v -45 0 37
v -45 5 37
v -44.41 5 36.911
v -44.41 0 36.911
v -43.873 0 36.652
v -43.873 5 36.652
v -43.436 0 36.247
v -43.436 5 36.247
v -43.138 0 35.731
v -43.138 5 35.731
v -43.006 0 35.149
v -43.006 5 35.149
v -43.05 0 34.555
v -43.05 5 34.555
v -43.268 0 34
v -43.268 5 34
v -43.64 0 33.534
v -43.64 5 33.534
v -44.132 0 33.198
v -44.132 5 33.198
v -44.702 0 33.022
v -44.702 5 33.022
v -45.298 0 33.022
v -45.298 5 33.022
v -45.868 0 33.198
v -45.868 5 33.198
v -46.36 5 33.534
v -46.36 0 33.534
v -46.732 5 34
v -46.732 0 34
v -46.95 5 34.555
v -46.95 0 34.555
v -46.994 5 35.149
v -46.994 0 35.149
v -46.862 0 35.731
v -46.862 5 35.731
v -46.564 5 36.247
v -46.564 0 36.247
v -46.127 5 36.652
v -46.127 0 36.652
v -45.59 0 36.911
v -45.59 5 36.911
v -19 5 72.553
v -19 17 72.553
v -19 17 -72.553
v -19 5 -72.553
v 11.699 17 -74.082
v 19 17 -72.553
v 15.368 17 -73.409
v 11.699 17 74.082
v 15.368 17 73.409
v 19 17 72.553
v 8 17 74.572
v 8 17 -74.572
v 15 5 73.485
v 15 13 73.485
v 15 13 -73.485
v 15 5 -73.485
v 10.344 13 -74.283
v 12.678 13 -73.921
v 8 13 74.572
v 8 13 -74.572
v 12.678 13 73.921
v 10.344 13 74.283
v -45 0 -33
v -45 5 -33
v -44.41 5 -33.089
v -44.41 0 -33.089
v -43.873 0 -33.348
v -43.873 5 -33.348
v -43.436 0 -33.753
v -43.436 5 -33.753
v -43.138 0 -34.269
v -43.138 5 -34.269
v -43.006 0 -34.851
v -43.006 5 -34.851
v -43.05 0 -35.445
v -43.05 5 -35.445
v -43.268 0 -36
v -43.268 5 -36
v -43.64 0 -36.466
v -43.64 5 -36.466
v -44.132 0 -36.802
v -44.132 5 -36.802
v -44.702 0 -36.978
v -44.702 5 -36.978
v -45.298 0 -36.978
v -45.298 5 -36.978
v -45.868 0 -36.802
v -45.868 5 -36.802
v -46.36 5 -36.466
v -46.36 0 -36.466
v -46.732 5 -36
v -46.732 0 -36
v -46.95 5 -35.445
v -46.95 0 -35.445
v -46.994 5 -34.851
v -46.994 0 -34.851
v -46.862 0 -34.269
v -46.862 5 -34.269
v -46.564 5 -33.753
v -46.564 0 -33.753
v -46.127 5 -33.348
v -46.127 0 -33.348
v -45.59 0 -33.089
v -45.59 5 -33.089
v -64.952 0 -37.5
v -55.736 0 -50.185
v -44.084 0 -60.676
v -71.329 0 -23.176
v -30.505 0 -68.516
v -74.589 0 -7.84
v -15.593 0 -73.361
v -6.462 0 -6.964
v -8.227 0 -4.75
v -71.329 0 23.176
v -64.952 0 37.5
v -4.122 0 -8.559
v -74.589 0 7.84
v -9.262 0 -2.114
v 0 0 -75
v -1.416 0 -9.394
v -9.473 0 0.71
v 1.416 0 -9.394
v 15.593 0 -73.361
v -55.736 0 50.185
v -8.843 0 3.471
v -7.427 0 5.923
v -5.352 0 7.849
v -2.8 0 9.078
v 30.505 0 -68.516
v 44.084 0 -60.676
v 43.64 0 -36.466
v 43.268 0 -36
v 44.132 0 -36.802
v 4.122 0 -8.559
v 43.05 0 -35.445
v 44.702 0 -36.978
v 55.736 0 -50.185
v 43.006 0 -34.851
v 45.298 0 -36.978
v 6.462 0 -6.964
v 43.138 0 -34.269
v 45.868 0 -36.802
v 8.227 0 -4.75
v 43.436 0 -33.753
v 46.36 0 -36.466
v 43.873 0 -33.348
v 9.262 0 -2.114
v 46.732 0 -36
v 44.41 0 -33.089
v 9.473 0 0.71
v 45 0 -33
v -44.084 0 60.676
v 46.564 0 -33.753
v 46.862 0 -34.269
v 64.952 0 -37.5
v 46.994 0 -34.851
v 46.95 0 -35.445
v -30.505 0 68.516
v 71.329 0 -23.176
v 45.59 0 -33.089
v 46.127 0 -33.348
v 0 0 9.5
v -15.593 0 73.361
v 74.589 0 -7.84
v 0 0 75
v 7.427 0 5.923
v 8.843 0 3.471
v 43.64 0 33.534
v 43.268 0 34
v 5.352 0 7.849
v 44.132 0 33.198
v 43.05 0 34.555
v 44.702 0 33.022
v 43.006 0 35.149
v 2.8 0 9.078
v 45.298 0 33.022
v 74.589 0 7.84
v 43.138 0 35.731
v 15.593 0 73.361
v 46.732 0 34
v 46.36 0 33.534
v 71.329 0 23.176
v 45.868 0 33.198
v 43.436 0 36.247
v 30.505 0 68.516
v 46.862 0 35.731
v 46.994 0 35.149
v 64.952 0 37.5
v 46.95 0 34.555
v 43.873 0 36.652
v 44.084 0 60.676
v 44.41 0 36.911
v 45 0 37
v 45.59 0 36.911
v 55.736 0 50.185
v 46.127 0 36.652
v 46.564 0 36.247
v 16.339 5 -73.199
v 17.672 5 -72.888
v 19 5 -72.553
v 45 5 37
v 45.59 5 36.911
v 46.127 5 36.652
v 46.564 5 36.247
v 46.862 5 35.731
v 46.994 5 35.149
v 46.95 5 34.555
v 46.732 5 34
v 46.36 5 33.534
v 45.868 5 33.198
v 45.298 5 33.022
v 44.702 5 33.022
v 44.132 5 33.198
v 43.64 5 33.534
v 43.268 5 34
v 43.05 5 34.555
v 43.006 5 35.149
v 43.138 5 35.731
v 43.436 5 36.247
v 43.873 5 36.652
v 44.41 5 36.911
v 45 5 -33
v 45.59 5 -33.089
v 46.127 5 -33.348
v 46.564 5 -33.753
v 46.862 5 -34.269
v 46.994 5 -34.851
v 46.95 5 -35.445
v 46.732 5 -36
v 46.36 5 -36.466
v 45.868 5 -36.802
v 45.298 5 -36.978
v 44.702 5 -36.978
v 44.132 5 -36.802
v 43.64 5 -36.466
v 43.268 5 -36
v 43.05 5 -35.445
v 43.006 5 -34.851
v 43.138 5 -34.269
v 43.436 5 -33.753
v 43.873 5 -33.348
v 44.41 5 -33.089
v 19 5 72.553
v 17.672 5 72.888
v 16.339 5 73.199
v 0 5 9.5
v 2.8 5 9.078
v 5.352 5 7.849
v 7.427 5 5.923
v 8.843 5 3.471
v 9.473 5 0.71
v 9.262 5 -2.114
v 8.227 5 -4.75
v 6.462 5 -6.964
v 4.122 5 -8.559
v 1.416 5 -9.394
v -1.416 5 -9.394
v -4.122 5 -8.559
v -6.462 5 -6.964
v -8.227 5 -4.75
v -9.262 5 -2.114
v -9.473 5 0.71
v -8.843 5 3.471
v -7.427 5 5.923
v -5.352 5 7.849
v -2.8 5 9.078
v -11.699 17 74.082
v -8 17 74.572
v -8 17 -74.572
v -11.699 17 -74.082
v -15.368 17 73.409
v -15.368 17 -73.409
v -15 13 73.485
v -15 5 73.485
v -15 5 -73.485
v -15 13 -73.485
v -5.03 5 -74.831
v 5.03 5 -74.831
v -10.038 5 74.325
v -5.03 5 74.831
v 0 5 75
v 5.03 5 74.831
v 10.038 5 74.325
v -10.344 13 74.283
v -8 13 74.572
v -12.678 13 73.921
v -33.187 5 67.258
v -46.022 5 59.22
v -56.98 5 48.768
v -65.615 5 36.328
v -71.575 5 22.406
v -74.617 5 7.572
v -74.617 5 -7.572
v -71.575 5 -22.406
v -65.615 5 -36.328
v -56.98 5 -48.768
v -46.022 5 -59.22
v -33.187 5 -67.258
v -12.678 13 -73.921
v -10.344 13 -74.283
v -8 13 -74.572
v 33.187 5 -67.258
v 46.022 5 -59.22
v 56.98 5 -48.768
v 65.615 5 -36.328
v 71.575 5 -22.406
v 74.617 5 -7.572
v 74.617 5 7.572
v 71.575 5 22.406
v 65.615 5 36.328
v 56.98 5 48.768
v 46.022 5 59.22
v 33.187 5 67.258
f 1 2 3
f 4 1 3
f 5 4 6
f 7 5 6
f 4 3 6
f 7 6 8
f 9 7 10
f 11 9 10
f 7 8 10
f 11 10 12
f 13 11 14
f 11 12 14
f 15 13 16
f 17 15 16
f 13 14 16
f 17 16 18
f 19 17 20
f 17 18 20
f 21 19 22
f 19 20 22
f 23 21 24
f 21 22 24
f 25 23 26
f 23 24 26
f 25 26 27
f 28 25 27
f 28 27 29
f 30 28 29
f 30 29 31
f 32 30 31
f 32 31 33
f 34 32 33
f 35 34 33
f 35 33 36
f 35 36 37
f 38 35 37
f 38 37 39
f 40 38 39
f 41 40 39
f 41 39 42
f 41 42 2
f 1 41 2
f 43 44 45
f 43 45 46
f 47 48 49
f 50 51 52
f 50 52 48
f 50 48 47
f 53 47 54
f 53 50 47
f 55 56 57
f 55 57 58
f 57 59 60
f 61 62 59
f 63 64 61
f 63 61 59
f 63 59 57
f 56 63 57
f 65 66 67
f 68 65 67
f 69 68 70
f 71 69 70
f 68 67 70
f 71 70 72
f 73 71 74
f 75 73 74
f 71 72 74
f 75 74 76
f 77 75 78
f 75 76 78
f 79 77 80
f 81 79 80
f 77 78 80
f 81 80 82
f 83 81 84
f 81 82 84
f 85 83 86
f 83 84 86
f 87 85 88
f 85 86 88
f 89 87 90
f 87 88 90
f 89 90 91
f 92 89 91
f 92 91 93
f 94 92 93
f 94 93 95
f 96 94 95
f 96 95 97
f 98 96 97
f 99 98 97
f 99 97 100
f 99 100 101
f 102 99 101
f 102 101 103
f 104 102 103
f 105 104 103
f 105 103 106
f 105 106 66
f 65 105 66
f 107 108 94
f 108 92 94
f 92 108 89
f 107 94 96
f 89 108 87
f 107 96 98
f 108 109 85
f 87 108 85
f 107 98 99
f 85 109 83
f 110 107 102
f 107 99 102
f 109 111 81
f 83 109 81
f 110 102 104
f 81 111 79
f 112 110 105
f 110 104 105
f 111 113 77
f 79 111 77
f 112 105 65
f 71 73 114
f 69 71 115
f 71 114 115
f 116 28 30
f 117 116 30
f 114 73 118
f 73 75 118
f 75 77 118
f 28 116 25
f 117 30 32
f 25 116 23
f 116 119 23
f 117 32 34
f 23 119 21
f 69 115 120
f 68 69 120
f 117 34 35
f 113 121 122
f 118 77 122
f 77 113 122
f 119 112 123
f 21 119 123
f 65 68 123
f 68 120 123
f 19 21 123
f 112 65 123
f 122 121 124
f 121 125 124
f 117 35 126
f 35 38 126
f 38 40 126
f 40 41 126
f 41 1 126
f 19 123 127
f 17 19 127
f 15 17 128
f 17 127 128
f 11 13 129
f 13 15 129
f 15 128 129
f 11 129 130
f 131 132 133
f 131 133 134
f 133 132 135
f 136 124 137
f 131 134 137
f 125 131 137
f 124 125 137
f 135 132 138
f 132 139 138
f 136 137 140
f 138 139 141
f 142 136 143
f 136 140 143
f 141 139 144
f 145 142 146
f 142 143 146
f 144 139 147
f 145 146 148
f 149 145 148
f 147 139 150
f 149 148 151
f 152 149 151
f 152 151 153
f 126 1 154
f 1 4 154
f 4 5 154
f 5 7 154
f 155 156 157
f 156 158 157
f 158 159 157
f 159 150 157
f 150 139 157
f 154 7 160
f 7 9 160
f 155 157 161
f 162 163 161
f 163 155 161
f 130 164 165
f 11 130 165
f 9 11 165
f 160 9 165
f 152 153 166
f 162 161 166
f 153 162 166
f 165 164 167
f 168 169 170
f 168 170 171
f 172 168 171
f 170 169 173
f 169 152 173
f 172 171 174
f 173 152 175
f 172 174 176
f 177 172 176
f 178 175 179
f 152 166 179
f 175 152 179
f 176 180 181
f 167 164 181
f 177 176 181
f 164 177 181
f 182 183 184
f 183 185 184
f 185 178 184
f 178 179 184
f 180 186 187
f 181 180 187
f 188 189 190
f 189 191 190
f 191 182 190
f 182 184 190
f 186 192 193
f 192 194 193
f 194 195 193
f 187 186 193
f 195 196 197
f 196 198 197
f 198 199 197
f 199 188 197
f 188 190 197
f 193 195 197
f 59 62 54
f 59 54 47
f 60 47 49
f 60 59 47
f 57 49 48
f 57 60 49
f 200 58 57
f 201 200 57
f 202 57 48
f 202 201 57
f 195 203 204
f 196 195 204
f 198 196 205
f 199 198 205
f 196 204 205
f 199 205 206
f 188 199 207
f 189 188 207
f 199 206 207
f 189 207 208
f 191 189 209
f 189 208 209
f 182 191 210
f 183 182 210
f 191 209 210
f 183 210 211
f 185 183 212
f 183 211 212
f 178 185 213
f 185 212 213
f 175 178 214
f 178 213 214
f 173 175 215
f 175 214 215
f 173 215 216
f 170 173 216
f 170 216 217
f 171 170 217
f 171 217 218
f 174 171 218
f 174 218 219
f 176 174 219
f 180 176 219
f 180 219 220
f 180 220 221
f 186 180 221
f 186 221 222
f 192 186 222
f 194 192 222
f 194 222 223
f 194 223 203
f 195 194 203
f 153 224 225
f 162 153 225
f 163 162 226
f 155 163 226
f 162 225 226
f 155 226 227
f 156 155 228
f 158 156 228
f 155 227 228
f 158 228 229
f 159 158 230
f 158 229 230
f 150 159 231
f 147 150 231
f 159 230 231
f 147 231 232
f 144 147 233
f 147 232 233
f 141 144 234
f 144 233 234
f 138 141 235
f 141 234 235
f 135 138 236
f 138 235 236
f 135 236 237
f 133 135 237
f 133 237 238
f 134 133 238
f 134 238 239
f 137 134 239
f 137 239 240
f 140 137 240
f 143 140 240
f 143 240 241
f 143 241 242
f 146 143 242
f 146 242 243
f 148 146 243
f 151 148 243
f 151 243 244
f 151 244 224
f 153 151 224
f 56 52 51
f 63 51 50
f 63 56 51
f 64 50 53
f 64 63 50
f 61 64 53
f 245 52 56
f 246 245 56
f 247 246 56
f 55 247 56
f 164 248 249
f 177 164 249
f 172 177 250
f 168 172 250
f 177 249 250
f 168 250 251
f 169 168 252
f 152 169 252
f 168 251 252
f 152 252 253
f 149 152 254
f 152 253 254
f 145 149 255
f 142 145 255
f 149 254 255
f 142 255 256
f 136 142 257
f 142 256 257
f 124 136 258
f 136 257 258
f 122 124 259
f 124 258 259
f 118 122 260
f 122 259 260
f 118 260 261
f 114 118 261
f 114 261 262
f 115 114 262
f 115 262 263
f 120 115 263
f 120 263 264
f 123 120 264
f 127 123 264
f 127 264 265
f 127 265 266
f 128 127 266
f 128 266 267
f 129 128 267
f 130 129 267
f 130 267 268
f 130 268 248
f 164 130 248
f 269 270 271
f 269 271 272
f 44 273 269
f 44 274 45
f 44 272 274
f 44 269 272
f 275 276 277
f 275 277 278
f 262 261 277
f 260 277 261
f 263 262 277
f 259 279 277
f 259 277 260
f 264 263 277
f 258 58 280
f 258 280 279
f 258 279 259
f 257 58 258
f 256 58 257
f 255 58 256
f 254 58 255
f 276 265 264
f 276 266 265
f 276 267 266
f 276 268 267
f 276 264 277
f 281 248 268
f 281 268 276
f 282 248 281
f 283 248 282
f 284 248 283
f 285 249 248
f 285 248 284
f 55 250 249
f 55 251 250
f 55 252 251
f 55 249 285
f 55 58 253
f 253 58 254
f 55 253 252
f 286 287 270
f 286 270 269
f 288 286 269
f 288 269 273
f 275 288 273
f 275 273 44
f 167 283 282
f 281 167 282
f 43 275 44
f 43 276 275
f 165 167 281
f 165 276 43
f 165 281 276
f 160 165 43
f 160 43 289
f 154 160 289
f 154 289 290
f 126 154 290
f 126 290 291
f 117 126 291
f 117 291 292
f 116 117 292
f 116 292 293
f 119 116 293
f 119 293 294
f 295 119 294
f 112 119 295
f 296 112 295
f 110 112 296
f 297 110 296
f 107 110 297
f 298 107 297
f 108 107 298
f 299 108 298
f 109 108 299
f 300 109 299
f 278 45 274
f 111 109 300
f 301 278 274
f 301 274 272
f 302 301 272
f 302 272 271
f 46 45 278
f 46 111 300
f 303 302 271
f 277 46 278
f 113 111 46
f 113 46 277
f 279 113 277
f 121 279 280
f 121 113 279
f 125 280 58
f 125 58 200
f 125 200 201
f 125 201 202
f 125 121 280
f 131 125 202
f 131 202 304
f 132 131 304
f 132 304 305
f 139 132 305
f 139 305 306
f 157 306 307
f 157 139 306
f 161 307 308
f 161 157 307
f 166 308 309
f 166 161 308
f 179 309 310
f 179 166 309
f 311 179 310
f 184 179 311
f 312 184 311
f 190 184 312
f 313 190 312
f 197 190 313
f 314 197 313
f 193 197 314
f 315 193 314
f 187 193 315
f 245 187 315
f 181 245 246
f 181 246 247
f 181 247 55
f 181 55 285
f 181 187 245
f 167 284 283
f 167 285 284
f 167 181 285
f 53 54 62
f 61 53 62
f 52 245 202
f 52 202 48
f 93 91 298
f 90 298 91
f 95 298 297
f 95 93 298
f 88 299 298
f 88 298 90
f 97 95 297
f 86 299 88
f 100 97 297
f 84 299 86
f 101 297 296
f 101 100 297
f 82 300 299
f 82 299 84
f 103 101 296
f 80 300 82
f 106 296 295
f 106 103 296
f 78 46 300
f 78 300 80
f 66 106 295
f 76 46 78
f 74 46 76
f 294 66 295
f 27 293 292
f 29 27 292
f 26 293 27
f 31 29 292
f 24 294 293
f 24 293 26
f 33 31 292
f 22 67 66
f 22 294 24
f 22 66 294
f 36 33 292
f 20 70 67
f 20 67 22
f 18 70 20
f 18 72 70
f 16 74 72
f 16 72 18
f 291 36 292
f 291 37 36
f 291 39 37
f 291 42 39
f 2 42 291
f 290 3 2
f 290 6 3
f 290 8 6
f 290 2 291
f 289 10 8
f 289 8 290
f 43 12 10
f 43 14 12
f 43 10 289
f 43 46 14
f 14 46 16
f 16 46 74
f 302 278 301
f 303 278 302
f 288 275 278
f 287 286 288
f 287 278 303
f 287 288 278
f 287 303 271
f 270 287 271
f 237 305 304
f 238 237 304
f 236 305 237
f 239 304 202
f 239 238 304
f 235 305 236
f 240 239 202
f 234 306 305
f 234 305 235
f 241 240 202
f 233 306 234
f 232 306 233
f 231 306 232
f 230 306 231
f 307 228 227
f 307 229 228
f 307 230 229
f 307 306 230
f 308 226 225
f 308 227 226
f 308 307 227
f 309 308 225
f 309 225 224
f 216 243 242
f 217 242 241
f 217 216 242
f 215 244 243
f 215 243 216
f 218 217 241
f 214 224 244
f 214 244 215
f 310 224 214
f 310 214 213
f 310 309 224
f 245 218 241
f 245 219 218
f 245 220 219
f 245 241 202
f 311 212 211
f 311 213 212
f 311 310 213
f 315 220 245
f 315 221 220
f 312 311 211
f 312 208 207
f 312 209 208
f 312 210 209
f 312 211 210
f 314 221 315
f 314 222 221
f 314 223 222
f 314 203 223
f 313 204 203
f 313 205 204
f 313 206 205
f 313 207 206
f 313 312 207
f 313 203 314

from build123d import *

# Parameters (mm, degrees)
SKETCH1_R                            = 75
BOSS_EXTRUDE1_DEPTH                  = 5
BOSS_EXTRUDE2_REACH                  = 108.184
BOSS_EXTRUDE2_END_RADIUS             = 75
BOSS_EXTRUDE2_DIRECTION_2_REACH      = 108.184
BOSS_EXTRUDE2_DIRECTION_2_END_RADIUS = 75
SKETCH3_R                            = 9.5
CUT_EXTRUDE1_DEPTH                   = 107.742681248
SKETCH4_R                            = 2
CUT_EXTRUDE2_DEPTH                   = 107.742681248


with BuildPart() as part:
    # Sketch1 → Boss-Extrude1 (new body)
    with BuildSketch(Plane(origin=(0, 0, 0), x_dir=(1, 0, 0), z_dir=(0, 1, 0))):
        with Locations(Location((0, 0, 0), (0, 0, 270))):
            Circle(SKETCH1_R)
    extrude(amount=BOSS_EXTRUDE1_DEPTH)

    # Boss-Extrude2: up to this cylinder (the profile starts inside it)
    boss_extrude2_end = Plane(origin=(0, 12, 0), z_dir=(0, -1, 0)) * Cylinder(BOSS_EXTRUDE2_END_RADIUS, 373.368, mode=Mode.PRIVATE)
    # Sketch2 → Boss-Extrude2 (add, up to the surface)
    with BuildSketch(Plane.XY, mode=Mode.PRIVATE) as boss_extrude2_sk1:
        Polygon((-15, 5), (-15, 13), (-8, 13), (-8, 17), (-19, 17), (-19, 5), align=None)
    boss_extrude2_tool1 = extrude(boss_extrude2_sk1.sketch, amount=BOSS_EXTRUDE2_REACH, mode=Mode.PRIVATE) & boss_extrude2_end
    add(boss_extrude2_tool1.solids().sort_by_distance((-15.162788, 9, 0))[0])
    # Sketch2 → Boss-Extrude2 (add, up to the surface)
    with BuildSketch(Plane.XY, mode=Mode.PRIVATE) as boss_extrude2_sk2:
        Polygon((8, 17), (8, 13), (15, 13), (15, 5), (19, 5), (19, 17), align=None)
    boss_extrude2_tool2 = extrude(boss_extrude2_sk2.sketch, amount=BOSS_EXTRUDE2_REACH, mode=Mode.PRIVATE) & boss_extrude2_end
    add(boss_extrude2_tool2.solids().sort_by_distance((8.162788, 15, 0))[0])

    # Boss-Extrude2 direction 2: up to this cylinder (the profile starts inside it)
    boss_extrude2_direction_2_end = Plane(origin=(0, 12, 0), z_dir=(0, -1, 0)) * Cylinder(BOSS_EXTRUDE2_DIRECTION_2_END_RADIUS, 373.368, mode=Mode.PRIVATE)
    # Sketch2 → Boss-Extrude2 direction 2 (add, up to the surface)
    with BuildSketch(Plane.XY, mode=Mode.PRIVATE) as boss_extrude2_direction_2_sk1:
        Polygon((-15, 5), (-15, 13), (-8, 13), (-8, 17), (-19, 17), (-19, 5), align=None)
    boss_extrude2_direction_2_tool1 = extrude(boss_extrude2_direction_2_sk1.sketch, amount=-BOSS_EXTRUDE2_DIRECTION_2_REACH, mode=Mode.PRIVATE) & boss_extrude2_direction_2_end
    add(boss_extrude2_direction_2_tool1.solids().sort_by_distance((-15.162788, 9, 0))[0])
    # Sketch2 → Boss-Extrude2 direction 2 (add, up to the surface)
    with BuildSketch(Plane.XY, mode=Mode.PRIVATE) as boss_extrude2_direction_2_sk2:
        Polygon((8, 17), (8, 13), (15, 13), (15, 5), (19, 5), (19, 17), align=None)
    boss_extrude2_direction_2_tool2 = extrude(boss_extrude2_direction_2_sk2.sketch, amount=-BOSS_EXTRUDE2_DIRECTION_2_REACH, mode=Mode.PRIVATE) & boss_extrude2_direction_2_end
    add(boss_extrude2_direction_2_tool2.solids().sort_by_distance((8.162788, 15, 0))[0])

    # Sketch3 → Cut-Extrude1 (cut, through all)
    with BuildSketch(Plane(origin=(0, 5, 0), x_dir=(1, 0, 0), z_dir=(0, 1, 0))):
        with Locations(Location((0, 0, 0), (0, 0, 270))):
            Circle(SKETCH3_R)
    extrude(amount=-CUT_EXTRUDE1_DEPTH, mode=Mode.SUBTRACT)

    # Sketch4 → Cut-Extrude2 (cut, through all)
    with BuildSketch(Plane(origin=(0, 5, 0), x_dir=(1, 0, 0), z_dir=(0, 1, 0))):
        with Locations(Location((-45, 35, 0), (0, 0, 270))):
            Circle(SKETCH4_R)
        with Locations(Location((45, 35, 0), (0, 0, 270))):
            Circle(SKETCH4_R)
        with Locations(Location((45, -35, 0), (0, 0, 270))):
            Circle(SKETCH4_R)
        with Locations(Location((-45, -35, 0), (0, 0, 270))):
            Circle(SKETCH4_R)
    extrude(amount=-CUT_EXTRUDE2_DEPTH, mode=Mode.SUBTRACT)


solid = part.part
